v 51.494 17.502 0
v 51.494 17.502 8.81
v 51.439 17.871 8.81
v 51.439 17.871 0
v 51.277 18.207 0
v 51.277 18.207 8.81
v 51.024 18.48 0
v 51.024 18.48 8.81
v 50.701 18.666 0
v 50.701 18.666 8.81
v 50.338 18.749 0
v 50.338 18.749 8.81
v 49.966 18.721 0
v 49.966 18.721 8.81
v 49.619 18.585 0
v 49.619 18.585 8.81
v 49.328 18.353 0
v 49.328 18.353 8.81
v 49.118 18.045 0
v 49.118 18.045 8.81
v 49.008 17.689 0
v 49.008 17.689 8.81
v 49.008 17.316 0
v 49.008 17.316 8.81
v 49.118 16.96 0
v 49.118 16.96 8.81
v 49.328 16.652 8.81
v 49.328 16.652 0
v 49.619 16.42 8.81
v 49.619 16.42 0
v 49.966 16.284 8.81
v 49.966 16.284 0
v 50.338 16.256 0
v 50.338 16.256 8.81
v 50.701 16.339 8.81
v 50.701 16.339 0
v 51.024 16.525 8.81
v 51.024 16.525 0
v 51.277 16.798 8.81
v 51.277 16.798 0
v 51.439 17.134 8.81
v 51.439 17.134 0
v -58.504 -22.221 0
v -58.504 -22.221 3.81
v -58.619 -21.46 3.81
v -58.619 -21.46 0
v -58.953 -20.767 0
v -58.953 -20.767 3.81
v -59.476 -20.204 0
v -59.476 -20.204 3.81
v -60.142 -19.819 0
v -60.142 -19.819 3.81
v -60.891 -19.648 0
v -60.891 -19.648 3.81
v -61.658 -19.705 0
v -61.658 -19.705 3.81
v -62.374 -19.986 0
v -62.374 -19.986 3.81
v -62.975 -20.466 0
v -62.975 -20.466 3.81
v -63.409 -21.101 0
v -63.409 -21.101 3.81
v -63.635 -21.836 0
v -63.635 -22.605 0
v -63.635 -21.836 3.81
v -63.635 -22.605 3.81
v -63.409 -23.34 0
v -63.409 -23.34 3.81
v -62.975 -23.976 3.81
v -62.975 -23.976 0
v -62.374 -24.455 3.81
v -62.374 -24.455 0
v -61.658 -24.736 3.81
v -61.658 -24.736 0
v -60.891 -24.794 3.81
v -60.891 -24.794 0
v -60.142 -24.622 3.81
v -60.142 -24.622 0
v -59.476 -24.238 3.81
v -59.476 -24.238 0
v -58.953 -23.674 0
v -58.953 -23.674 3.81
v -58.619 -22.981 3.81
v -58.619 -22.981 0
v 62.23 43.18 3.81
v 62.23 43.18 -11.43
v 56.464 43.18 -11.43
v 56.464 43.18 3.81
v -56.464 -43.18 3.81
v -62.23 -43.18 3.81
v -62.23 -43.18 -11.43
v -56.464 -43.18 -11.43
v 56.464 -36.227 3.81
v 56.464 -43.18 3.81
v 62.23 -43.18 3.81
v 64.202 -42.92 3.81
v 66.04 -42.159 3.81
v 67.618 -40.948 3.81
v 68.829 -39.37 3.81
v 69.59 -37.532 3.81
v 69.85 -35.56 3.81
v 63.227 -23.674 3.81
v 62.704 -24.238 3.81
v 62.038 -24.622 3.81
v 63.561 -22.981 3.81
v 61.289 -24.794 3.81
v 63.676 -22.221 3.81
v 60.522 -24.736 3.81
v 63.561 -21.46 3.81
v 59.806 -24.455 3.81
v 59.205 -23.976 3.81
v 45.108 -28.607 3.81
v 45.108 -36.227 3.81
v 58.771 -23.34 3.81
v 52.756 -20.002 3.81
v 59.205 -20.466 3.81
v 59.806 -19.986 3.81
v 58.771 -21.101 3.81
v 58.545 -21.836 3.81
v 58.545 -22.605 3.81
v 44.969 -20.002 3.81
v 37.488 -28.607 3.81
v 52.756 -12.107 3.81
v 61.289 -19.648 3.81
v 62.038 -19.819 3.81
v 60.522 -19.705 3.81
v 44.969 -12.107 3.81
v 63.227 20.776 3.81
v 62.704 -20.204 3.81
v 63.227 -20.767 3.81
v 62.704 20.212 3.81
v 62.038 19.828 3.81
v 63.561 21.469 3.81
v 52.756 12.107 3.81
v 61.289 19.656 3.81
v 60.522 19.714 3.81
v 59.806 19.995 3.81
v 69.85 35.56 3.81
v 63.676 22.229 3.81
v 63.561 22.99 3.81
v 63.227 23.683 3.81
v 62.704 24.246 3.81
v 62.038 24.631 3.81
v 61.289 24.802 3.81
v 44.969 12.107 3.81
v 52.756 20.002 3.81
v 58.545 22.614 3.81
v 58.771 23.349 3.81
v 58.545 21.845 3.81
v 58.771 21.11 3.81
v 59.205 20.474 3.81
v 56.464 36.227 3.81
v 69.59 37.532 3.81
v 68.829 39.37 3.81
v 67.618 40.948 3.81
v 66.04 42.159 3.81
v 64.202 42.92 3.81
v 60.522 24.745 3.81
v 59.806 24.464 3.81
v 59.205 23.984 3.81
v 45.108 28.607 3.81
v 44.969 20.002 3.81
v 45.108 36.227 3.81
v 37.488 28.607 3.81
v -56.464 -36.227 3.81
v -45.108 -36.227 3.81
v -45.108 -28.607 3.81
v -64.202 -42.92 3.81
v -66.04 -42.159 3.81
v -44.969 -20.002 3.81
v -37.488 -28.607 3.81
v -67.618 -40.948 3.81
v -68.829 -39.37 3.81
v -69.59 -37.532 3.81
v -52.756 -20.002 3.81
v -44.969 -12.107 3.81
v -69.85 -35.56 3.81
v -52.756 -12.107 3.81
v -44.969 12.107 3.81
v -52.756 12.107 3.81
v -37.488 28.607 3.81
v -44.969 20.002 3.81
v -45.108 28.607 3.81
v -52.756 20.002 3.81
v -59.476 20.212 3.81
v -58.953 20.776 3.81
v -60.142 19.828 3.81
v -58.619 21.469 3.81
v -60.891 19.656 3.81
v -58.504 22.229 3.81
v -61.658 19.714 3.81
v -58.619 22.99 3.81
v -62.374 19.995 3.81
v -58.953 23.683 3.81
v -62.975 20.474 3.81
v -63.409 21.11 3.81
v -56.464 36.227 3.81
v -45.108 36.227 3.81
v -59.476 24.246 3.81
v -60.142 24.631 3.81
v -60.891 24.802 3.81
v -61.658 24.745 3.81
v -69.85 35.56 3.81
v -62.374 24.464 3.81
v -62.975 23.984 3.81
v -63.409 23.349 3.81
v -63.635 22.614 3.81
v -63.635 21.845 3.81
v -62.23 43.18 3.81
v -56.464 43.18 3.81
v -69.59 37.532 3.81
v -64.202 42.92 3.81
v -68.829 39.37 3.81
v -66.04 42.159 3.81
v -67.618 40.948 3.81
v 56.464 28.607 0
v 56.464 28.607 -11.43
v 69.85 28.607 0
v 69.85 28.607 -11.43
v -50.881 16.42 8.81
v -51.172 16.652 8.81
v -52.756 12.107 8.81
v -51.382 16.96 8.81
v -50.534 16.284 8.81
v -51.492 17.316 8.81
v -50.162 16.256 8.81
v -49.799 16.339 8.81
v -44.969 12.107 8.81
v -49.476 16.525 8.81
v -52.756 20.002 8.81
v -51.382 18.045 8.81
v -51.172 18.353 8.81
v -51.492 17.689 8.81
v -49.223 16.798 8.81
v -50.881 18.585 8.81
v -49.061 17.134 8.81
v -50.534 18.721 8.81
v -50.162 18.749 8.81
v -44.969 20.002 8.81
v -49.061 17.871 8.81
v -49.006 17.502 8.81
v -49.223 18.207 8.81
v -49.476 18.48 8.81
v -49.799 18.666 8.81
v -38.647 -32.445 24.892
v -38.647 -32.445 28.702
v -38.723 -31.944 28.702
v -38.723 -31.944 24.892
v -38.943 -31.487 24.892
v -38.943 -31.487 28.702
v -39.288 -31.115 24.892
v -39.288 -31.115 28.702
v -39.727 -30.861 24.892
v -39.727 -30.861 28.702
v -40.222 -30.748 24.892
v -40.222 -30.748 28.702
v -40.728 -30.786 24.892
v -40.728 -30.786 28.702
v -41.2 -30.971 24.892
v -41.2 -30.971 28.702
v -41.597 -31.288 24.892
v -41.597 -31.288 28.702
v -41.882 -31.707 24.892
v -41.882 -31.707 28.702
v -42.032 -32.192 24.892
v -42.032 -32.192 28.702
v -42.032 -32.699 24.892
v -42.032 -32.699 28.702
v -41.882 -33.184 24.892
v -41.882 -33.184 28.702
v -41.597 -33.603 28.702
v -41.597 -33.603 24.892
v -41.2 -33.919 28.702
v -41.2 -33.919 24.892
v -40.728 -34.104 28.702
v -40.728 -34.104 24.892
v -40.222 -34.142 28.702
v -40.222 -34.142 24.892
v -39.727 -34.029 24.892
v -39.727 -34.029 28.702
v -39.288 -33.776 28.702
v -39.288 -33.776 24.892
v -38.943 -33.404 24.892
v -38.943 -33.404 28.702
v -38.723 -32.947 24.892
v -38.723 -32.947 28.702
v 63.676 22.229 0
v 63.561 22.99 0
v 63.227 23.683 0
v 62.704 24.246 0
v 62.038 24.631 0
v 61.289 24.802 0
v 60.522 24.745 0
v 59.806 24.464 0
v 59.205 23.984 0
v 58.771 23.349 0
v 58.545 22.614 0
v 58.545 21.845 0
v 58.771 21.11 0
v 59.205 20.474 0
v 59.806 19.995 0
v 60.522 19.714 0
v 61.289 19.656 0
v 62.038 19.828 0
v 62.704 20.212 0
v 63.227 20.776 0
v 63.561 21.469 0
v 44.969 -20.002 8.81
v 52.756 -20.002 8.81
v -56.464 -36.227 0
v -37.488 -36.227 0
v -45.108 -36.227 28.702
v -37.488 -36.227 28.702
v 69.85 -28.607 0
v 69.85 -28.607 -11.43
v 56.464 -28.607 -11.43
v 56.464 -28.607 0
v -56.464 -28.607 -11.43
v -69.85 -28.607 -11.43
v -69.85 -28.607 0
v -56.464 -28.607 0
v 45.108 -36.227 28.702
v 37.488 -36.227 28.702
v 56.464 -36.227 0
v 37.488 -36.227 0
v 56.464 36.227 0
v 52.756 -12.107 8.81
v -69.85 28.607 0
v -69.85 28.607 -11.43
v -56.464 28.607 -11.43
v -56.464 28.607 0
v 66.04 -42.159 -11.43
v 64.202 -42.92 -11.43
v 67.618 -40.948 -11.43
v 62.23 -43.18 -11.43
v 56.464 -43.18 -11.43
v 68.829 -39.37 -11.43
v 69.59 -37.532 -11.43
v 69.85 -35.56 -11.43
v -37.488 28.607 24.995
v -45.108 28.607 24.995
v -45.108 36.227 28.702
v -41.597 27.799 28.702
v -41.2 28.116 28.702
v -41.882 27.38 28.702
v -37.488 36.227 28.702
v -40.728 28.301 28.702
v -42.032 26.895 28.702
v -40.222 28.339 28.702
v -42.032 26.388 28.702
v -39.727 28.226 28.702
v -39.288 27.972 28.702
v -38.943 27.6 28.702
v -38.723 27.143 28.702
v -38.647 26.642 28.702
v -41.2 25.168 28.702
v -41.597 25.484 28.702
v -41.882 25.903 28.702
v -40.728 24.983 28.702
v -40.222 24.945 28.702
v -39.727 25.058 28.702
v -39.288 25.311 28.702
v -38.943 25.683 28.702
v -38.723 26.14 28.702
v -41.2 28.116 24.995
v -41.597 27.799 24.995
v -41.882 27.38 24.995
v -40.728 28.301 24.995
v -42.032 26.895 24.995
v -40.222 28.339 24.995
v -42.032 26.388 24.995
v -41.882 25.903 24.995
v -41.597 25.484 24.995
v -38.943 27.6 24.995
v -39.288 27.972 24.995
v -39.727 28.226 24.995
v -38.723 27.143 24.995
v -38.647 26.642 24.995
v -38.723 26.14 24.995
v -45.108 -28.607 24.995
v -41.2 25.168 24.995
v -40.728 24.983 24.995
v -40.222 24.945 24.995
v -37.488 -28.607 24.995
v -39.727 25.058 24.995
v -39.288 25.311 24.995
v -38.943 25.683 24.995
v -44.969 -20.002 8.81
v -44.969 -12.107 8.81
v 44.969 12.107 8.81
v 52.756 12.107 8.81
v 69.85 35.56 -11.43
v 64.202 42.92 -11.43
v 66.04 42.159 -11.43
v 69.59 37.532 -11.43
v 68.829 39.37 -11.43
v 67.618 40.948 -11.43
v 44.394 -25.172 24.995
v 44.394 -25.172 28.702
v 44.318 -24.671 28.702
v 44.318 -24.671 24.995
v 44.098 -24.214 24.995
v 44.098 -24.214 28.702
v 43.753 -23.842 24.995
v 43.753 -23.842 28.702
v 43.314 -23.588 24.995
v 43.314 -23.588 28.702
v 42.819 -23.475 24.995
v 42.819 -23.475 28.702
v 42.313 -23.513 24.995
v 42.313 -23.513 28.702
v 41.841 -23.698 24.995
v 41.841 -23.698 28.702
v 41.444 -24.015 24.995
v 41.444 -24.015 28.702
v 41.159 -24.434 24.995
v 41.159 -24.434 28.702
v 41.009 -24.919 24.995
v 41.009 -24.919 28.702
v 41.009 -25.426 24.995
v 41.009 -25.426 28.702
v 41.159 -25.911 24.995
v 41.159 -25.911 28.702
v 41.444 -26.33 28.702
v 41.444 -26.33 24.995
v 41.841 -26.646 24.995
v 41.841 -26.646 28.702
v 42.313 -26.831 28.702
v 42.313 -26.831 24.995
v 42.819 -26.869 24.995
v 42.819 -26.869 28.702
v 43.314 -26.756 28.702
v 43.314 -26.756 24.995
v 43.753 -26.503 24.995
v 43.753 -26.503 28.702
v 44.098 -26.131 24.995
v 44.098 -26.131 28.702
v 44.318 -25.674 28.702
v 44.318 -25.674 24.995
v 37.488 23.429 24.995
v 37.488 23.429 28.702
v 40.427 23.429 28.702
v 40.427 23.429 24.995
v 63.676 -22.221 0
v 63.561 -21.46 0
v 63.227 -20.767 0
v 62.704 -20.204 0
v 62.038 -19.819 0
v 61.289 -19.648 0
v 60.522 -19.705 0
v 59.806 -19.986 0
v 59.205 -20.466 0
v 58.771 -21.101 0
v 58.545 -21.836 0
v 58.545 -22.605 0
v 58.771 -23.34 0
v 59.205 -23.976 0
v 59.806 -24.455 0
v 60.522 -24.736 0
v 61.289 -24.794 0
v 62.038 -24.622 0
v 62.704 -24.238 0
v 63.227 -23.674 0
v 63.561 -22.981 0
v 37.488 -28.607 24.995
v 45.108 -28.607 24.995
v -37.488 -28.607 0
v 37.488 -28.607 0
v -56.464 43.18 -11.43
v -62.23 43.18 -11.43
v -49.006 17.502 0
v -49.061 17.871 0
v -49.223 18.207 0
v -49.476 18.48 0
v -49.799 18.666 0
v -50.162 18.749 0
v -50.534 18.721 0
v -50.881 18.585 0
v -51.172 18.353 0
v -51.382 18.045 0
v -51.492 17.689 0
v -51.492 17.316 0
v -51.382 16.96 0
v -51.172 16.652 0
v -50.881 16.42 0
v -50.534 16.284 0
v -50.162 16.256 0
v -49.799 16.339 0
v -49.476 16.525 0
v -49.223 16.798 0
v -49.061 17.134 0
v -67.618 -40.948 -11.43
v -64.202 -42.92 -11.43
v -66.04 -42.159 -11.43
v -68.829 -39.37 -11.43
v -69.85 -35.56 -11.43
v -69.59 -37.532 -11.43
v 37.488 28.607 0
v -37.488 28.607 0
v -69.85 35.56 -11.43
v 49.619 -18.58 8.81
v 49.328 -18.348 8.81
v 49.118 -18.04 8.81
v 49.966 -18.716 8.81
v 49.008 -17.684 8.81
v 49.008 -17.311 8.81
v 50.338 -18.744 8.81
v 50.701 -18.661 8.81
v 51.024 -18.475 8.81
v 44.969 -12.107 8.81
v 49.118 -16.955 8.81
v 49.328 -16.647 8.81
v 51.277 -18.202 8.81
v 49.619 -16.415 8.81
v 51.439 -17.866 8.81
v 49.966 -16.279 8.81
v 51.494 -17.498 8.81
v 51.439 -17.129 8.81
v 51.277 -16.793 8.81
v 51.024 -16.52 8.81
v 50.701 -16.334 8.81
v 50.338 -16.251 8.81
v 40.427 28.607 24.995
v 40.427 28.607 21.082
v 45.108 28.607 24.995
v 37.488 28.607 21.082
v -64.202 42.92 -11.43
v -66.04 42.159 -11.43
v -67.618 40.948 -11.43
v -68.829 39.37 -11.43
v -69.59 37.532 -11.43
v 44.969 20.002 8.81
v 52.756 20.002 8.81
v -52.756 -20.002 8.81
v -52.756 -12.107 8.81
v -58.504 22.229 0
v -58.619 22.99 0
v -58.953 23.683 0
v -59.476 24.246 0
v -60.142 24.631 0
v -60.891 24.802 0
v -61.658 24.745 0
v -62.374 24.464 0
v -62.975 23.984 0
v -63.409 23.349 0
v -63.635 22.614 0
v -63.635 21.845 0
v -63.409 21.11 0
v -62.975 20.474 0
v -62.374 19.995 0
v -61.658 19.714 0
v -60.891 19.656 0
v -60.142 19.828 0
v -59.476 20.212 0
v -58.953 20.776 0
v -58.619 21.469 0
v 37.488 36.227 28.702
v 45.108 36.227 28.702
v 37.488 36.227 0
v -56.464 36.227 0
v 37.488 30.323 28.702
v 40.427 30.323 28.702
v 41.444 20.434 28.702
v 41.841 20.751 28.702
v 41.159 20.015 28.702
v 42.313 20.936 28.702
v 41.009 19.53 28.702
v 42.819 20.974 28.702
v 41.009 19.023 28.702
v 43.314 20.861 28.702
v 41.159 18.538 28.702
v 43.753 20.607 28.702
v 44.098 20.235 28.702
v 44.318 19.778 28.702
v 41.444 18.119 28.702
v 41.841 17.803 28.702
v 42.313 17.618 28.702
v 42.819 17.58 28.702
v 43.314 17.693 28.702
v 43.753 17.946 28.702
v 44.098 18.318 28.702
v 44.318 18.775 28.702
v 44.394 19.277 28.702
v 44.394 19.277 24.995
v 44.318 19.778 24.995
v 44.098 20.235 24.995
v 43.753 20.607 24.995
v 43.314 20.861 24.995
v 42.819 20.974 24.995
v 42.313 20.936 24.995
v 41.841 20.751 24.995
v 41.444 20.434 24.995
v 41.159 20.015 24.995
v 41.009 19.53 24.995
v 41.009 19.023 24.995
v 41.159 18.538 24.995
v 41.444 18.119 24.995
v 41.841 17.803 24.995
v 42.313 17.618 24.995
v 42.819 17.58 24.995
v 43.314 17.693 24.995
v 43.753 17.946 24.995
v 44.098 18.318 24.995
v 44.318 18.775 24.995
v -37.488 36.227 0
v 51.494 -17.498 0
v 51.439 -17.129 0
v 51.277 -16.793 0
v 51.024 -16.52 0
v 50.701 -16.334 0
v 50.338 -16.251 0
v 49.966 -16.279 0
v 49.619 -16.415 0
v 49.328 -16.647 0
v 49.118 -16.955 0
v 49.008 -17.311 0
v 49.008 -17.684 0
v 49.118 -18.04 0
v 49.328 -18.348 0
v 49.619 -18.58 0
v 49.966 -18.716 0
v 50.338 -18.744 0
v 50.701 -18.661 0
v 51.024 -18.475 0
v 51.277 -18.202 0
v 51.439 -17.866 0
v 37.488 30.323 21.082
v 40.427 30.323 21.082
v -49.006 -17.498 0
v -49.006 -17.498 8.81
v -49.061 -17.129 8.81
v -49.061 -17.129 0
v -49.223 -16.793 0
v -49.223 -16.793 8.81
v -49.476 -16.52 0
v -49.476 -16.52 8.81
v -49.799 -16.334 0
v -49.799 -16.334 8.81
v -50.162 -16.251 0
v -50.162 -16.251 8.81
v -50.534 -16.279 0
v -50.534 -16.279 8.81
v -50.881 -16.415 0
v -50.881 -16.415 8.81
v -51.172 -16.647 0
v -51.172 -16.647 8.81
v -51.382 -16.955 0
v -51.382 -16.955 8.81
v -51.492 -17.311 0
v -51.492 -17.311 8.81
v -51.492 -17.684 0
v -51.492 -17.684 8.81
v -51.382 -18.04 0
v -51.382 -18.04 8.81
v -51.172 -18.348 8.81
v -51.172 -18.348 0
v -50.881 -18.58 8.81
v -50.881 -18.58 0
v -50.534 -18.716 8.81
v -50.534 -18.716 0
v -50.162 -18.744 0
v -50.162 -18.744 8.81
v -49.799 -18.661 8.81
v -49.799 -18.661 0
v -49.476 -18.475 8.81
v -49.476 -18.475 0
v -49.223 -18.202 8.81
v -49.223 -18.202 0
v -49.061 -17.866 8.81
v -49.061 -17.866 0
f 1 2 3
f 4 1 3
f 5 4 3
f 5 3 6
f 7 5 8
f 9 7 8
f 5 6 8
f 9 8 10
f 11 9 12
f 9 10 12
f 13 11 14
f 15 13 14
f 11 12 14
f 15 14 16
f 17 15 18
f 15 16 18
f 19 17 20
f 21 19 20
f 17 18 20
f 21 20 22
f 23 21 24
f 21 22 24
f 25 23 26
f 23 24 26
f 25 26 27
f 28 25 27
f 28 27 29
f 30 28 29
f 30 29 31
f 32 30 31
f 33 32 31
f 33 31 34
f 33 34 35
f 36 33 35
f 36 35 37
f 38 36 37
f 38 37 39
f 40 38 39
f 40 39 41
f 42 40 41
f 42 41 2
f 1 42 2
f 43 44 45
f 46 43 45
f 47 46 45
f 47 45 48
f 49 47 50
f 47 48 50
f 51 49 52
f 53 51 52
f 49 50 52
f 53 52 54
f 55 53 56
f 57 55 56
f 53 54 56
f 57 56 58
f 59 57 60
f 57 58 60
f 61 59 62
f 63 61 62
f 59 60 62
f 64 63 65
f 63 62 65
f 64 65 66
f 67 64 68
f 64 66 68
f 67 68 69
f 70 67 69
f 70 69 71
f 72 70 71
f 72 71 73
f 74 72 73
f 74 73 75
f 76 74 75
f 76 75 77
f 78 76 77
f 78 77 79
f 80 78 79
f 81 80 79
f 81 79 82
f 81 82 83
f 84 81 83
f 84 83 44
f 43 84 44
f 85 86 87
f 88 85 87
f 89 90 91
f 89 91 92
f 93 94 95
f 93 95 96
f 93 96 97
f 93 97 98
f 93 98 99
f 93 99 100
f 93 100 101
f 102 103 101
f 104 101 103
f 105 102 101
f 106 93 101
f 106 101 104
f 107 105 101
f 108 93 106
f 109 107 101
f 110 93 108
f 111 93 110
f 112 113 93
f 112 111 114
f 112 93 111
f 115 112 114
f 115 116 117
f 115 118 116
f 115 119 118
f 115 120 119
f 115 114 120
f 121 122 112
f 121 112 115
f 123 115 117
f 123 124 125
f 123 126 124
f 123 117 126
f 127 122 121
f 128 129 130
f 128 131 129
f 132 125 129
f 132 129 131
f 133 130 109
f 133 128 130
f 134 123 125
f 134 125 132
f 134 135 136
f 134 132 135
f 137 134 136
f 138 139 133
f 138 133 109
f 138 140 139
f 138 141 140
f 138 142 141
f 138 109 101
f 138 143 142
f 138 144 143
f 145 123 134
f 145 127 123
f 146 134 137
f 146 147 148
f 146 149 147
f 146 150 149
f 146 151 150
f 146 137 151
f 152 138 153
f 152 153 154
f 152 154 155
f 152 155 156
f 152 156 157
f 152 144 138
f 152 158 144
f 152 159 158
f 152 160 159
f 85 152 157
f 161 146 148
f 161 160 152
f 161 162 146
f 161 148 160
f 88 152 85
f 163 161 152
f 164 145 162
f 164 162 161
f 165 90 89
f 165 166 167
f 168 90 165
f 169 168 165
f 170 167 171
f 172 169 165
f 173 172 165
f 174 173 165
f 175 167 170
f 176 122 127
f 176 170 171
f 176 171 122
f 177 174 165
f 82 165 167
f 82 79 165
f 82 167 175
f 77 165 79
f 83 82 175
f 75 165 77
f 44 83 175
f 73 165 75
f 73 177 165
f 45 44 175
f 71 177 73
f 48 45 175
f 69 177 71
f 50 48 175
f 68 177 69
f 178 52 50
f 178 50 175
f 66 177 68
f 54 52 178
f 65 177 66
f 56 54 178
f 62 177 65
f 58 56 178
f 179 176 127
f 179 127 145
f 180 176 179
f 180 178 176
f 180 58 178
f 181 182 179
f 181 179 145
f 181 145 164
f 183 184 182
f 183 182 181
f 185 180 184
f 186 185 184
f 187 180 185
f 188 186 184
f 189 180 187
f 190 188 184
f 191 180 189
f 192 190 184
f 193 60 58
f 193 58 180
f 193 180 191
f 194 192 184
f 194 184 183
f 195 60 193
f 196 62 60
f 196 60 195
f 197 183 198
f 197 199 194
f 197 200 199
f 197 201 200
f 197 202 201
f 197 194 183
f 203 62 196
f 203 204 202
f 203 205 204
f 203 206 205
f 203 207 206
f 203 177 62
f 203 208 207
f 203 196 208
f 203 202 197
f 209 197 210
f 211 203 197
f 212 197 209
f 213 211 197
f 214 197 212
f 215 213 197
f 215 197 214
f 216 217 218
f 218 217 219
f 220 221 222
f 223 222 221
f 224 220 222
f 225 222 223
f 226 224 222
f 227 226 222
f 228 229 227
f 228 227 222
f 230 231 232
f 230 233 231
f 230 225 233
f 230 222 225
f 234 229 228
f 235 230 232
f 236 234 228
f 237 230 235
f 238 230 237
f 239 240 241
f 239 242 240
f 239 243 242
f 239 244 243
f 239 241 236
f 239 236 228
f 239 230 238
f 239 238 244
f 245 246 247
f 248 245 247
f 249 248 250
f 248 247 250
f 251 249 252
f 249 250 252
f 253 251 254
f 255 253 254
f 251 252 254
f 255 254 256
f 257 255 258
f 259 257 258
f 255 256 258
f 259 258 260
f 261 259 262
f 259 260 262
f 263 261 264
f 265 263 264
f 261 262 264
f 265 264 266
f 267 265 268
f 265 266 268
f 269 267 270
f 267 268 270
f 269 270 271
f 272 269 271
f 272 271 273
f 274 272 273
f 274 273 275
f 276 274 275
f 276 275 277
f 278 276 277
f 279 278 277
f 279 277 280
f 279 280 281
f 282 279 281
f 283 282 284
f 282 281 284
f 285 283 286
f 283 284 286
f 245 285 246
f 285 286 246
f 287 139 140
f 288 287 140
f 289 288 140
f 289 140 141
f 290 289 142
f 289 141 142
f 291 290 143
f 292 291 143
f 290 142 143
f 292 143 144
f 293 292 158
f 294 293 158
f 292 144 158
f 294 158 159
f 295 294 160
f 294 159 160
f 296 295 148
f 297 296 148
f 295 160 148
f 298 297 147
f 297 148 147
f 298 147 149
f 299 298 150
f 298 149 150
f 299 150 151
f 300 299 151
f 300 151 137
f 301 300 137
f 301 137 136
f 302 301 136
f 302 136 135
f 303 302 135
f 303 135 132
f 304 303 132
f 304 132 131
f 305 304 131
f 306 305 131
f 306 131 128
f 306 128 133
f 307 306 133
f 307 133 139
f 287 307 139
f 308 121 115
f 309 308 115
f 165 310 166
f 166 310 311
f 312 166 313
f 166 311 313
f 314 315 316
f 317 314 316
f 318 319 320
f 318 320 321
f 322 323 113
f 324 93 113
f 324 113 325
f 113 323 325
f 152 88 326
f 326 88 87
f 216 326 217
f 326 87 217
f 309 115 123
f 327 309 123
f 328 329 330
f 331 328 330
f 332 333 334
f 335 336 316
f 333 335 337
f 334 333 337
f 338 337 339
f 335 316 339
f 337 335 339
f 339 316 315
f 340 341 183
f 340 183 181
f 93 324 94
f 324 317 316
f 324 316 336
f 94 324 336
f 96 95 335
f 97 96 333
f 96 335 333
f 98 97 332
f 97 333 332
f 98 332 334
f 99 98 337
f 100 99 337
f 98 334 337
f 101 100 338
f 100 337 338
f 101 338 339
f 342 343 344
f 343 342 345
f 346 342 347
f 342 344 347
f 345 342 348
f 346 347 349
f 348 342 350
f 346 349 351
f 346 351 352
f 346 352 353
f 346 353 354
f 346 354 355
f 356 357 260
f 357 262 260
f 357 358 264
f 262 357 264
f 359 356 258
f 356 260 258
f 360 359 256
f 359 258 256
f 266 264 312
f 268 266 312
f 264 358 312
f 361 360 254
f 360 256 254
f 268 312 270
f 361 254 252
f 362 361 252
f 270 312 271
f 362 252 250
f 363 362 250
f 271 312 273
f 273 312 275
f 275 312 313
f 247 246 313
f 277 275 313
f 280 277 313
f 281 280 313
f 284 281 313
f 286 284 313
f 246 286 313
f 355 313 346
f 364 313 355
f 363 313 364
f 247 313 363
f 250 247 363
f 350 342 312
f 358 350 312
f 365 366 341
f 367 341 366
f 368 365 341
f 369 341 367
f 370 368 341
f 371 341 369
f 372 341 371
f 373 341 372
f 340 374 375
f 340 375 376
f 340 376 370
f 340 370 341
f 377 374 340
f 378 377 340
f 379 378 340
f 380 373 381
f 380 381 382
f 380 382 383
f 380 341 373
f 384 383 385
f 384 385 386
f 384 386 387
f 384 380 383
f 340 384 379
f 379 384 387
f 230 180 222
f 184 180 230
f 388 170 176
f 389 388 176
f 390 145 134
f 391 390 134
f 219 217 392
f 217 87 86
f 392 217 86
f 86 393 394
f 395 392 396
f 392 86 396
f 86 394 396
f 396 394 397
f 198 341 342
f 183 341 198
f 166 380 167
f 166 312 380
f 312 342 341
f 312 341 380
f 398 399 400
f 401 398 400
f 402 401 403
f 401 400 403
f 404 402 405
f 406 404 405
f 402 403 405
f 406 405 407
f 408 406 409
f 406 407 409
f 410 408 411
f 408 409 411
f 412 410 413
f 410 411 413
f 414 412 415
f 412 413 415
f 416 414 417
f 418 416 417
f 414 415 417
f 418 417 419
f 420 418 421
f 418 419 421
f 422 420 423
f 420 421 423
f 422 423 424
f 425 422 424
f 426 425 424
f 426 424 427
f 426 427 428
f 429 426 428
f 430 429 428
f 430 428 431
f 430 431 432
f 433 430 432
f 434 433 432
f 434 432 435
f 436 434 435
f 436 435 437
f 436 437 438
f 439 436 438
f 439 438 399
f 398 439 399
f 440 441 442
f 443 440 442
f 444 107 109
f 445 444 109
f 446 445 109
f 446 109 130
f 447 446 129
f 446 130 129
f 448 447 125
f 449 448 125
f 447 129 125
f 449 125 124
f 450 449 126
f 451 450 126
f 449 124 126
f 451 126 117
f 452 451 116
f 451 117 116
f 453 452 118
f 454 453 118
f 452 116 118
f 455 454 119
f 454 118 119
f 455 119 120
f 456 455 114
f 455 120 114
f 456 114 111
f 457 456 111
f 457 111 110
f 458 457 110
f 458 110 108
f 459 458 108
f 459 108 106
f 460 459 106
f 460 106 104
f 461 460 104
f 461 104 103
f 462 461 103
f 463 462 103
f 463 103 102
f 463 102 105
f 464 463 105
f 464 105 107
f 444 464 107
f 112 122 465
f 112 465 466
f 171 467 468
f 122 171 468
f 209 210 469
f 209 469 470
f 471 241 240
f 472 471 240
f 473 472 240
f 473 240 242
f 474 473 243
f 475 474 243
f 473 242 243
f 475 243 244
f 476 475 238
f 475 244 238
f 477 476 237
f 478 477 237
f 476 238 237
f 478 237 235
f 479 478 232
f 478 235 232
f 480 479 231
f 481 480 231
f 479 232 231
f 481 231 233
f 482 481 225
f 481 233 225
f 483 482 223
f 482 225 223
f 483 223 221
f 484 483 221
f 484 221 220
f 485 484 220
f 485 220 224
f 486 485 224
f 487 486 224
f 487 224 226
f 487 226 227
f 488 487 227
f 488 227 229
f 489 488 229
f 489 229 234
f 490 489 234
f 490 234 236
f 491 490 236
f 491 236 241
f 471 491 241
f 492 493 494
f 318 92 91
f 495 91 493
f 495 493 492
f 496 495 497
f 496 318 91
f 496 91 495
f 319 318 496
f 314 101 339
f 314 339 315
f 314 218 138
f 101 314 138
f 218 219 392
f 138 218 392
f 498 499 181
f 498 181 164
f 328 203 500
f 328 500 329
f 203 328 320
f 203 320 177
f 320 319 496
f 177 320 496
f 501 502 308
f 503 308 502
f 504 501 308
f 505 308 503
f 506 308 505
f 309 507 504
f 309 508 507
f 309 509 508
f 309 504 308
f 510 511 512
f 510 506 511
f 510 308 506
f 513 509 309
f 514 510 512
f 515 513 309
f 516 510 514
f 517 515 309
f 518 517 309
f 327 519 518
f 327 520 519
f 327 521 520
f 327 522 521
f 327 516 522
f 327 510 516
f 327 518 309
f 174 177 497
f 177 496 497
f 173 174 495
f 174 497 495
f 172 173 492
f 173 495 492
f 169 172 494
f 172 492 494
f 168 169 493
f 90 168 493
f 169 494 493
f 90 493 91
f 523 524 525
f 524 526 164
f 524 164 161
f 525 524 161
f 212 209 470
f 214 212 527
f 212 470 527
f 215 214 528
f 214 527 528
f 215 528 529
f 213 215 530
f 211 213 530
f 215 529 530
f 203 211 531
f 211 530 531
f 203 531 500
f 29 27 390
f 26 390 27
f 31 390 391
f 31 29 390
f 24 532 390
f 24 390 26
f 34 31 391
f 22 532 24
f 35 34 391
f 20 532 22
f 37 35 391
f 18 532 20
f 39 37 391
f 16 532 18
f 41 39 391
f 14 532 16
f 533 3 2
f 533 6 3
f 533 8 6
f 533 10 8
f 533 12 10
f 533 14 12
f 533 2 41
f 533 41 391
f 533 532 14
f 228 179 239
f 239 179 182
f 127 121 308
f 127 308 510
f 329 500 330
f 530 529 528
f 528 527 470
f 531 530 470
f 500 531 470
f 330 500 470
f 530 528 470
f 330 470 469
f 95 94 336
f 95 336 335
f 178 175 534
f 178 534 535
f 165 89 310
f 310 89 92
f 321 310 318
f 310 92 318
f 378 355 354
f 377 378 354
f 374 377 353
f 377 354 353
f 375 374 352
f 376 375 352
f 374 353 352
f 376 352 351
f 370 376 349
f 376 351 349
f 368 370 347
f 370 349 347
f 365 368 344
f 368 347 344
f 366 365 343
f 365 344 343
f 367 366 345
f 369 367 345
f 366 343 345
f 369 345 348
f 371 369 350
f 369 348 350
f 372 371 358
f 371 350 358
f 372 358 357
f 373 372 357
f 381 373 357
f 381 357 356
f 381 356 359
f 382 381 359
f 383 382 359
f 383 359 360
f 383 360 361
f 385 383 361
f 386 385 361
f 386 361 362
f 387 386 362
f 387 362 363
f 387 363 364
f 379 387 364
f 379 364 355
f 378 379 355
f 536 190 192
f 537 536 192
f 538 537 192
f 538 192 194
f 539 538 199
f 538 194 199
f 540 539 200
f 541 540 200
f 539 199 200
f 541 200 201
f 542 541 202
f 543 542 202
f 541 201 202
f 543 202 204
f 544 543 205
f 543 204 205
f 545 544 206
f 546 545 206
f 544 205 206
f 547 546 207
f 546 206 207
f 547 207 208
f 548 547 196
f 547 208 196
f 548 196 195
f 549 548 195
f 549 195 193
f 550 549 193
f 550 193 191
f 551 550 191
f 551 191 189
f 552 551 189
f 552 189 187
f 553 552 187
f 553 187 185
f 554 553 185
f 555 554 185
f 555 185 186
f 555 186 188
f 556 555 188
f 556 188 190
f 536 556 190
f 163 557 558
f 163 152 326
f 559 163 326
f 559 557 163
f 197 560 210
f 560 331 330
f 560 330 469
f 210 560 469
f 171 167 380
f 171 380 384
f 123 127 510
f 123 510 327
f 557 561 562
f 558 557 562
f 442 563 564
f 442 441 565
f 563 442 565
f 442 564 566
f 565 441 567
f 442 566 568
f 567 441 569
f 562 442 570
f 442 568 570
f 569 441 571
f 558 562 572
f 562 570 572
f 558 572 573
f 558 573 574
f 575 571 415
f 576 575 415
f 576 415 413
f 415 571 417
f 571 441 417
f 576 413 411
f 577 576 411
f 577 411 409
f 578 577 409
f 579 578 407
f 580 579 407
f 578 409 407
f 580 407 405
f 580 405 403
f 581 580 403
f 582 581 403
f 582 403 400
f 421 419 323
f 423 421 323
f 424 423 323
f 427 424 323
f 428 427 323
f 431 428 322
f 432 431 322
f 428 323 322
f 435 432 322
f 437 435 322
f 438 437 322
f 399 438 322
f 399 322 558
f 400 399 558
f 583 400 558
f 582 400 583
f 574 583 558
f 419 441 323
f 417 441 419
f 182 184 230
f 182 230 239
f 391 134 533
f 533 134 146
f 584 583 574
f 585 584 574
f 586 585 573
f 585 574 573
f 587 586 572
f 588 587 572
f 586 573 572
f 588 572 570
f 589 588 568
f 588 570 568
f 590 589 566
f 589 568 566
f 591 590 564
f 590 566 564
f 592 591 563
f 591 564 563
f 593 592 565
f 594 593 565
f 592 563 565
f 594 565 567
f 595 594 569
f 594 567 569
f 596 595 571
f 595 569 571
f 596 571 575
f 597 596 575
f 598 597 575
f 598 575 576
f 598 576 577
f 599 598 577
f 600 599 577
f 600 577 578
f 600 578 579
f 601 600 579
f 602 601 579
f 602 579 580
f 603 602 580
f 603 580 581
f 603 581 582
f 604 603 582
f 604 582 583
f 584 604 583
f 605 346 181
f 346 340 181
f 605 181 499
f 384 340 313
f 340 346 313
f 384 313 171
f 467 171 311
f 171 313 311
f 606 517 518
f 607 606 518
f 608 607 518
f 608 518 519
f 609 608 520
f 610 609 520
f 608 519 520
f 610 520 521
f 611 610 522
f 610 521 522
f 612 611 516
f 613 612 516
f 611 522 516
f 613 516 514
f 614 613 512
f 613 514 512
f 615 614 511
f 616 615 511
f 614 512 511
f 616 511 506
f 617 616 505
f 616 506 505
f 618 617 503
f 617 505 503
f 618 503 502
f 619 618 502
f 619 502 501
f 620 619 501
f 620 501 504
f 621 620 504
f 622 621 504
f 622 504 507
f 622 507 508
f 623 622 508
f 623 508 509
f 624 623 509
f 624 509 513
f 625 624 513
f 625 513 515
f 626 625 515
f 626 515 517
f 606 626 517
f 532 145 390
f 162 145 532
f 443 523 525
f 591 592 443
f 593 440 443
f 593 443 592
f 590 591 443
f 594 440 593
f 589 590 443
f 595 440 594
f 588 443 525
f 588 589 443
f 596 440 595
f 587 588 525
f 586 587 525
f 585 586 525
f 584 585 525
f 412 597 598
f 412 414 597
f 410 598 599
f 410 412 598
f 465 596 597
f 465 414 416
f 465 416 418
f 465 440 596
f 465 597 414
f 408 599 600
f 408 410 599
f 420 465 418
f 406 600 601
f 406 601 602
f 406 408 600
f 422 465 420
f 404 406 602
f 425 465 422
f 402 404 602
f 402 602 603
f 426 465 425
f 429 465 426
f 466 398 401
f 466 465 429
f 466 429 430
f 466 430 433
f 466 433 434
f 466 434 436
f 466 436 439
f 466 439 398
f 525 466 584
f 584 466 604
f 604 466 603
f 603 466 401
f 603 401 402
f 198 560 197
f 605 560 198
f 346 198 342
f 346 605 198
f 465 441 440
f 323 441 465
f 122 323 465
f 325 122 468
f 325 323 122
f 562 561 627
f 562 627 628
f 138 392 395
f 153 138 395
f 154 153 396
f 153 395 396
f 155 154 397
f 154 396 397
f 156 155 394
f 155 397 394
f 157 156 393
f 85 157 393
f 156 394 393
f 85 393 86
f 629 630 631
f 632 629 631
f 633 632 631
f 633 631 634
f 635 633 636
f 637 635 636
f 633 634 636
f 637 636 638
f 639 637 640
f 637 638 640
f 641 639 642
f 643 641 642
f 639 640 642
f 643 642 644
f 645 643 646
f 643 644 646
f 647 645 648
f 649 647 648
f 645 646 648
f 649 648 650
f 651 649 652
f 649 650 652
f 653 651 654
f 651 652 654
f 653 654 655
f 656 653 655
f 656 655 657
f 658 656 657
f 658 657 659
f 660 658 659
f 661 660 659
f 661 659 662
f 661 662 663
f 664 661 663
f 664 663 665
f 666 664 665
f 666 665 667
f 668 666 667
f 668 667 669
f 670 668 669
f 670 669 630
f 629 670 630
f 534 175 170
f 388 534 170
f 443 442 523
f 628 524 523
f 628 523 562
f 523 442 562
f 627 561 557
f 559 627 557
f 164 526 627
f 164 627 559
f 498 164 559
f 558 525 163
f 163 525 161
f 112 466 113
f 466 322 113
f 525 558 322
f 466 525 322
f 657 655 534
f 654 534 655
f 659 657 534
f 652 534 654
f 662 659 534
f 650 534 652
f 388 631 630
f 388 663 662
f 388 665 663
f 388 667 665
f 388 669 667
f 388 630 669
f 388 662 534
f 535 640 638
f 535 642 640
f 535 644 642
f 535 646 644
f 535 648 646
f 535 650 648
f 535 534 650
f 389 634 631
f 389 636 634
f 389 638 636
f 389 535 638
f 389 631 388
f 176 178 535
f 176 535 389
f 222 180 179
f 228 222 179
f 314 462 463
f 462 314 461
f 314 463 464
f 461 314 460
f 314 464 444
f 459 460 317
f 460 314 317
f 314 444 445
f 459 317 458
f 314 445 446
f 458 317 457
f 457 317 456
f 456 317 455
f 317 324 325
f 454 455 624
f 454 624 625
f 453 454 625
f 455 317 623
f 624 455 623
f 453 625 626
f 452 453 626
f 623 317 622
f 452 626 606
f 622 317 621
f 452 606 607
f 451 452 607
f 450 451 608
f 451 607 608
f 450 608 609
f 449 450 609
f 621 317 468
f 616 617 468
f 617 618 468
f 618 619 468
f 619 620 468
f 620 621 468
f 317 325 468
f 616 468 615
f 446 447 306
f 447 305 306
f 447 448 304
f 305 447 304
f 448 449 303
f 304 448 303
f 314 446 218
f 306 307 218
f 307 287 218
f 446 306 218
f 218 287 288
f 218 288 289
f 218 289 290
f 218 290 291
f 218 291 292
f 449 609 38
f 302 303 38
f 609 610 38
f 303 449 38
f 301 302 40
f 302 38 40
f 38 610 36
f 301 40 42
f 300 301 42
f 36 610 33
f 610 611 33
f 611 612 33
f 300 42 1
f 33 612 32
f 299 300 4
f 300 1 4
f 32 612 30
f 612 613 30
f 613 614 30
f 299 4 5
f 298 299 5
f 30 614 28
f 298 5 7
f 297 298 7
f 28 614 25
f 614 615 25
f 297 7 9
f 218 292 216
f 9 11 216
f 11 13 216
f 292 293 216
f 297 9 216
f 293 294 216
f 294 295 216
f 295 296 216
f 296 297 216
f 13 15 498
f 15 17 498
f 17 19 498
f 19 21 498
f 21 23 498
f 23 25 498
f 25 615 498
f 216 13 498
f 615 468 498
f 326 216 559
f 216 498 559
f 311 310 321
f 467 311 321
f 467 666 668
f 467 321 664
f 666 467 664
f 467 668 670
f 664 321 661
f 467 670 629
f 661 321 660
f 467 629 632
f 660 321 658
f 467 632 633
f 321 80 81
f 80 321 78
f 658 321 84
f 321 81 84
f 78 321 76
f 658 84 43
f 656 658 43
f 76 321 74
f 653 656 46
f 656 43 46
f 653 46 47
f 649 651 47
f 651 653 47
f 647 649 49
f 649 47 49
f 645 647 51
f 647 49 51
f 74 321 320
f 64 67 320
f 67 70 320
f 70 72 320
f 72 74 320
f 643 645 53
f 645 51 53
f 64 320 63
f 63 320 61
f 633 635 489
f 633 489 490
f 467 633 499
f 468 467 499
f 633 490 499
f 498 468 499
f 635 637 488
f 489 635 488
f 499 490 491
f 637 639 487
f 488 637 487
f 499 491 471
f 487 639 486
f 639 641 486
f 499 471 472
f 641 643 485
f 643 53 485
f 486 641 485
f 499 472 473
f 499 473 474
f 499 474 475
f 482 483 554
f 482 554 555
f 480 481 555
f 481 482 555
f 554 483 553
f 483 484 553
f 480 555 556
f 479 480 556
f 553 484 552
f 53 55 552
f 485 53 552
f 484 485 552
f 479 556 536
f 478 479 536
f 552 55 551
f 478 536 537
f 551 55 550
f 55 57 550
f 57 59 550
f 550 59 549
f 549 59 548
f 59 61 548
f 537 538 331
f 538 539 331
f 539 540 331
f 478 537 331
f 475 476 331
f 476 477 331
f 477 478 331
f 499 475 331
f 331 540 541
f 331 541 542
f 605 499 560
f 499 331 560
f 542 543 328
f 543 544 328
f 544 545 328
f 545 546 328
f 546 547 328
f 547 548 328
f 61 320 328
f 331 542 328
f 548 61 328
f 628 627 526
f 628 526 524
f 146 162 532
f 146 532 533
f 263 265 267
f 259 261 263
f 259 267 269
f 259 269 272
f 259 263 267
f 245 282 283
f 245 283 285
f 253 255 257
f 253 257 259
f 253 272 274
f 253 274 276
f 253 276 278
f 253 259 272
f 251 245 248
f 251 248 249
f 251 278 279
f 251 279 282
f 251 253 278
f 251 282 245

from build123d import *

# Parameters (mm, degrees)
SKETCH1_W             = 112.9284
SKETCH1_H             = 57.214943904
BOSS_EXTRUDE1_DEPTH   = 3.81
BOSS_EXTRUDE2_START   = 11.43
BOSS_EXTRUDE2_DEPTH   = 11.43
CUT_EXTRUDE1_REACH    = 85.521
SKETCH3_R             = 2.58
SKETCH4_W             = 7.786771744
SKETCH4_H             = 7.895685894
BOSS_EXTRUDE3_DEPTH   = 5
CUT_EXTRUDE2_REACH    = 86.577
SKETCH5_R             = 1.25
SKETCH8_W             = 7.62
SKETCH8_H             = 7.62
BOSS_EXTRUDE4_DEPTH   = 24.892
BOSS_EXTRUDE4_2_DEPTH = 24.892
BOSS_EXTRUDE4_3_DEPTH = 24.892
BOSS_EXTRUDE4_4_DEPTH = 24.892
SKETCH9_W             = 7.62
SKETCH9_H             = 7.62
BOSS_EXTRUDE5_DEPTH   = 3.81
BOSS_EXTRUDE6_REACH   = 106.193
SKETCH10_W            = 7.62
SKETCH10_H            = 3.70730408
BOSS_EXTRUDE7_REACH   = 128.11
SKETCH11_W            = 3.81
SKETCH11_H            = 7.62
BOSS_EXTRUDE8_REACH   = 128.11
SKETCH12_W            = 3.81
SKETCH12_H            = 7.62
SKETCH14_R            = 1.7018
CUT_EXTRUDE3_DEPTH    = 3.81
SKETCH16_W            = 2.93944059
SKETCH16_H            = 6.893445181
CUT_EXTRUDE4_DEPTH    = 7.62


with BuildPart() as part:
    # Sketch1 → Boss-Extrude1 (new body)
    with BuildSketch(Plane.XY):
        with BuildLine():
            Line((-56.4642, -28.607471952), (-56.4642, 28.607471952))
            Line((-56.4642, 28.607471952), (-56.4642, 43.18))
            Line((-56.4642, 43.18), (-62.23, 43.18))
            ThreePointArc((-62.23, 43.18), (-67.618153673, 40.948153673), (-69.85, 35.56))
            Line((-69.85, 35.56), (-69.85, -35.56))
            ThreePointArc((-69.85, -35.56), (-67.618153673, -40.948153673), (-62.23, -43.18))
            Line((-62.23, -43.18), (-56.4642, -43.18))
            Line((-56.4642, -43.18), (-56.4642, -28.607471952))
        make_face()
        Rectangle(SKETCH1_W, SKETCH1_H)
        with BuildLine():
            Line((56.4642, 43.18), (56.4642, 28.607471952))
            Line((56.4642, 28.607471952), (56.4642, -28.607471952))
            Line((56.4642, -28.607471952), (56.4642, -43.18))
            Line((56.4642, -43.18), (62.23, -43.18))
            ThreePointArc((62.23, -43.18), (67.618153673, -40.948153673), (69.85, -35.56))
            Line((69.85, -35.56), (69.85, 35.56))
            ThreePointArc((69.85, 35.56), (67.618153673, 40.948153673), (62.23, 43.18))
            Line((62.23, 43.18), (56.4642, 43.18))
        make_face()
    extrude(amount=BOSS_EXTRUDE1_DEPTH)

    # Sketch2 → Boss-Extrude2 (add)
    with BuildSketch(Plane(origin=(0, 0, 0), x_dir=(-1, 0, 0), z_dir=(0, 0, -1)).offset(BOSS_EXTRUDE2_START)):
        with BuildLine():
            Line((-62.23, 43.18), (-56.4642, 43.18))
            Line((-56.4642, 43.18), (-56.4642, 28.607471952))
            Line((-56.4642, 28.607471952), (-69.85, 28.607471952))
            Line((-69.85, 28.607471952), (-69.85, 35.56))
            ThreePointArc((-69.85, 35.56), (-67.618153673, 40.948153673), (-62.23, 43.18))
        make_face()
        with BuildLine():
            Line((69.85, 28.607471952), (56.4642, 28.607471952))
            Line((56.4642, 28.607471952), (56.4642, 43.18))
            Line((56.4642, 43.18), (62.23, 43.18))
            ThreePointArc((62.23, 43.18), (67.618153673, 40.948153673), (69.85, 35.56))
            Line((69.85, 35.56), (69.85, 28.607471952))
        make_face()
        with BuildLine():
            Line((69.85, -35.56), (69.85, -28.607471952))
            Line((69.85, -28.607471952), (56.4642, -28.607471952))
            Line((56.4642, -28.607471952), (56.4642, -43.18))
            Line((56.4642, -43.18), (62.23, -43.18))
            ThreePointArc((62.23, -43.18), (67.618153673, -40.948153673), (69.85, -35.56))
        make_face()
        with BuildLine():
            Line((-69.85, -28.607471952), (-56.4642, -28.607471952))
            Line((-56.4642, -28.607471952), (-56.4642, -43.18))
            Line((-56.4642, -43.18), (-62.23, -43.18))
            ThreePointArc((-62.23, -43.18), (-67.618153673, -40.948153673), (-69.85, -35.56))
            Line((-69.85, -35.56), (-69.85, -28.607471952))
        make_face()
    extrude(amount=-BOSS_EXTRUDE2_DEPTH)

    # Sketch3 → Cut-Extrude1 (cut, up to next)
    with BuildSketch(Plane.XY.offset(3.81), mode=Mode.PRIVATE) as cut_extrude1_sk1:
        with Locations((-61.0842, 22.2292)):
            Circle(SKETCH3_R)
    cut_extrude1_tool1 = extrude(cut_extrude1_sk1.sketch, amount=-CUT_EXTRUDE1_REACH, mode=Mode.PRIVATE) & part.part
    # Sketch3 → Cut-Extrude1 (cut, up to next)
    with BuildSketch(Plane.XY.offset(3.81), mode=Mode.PRIVATE) as cut_extrude1_sk2:
        with Locations((-61.0842, -22.2208)):
            Circle(SKETCH3_R)
    cut_extrude1_tool2 = extrude(cut_extrude1_sk2.sketch, amount=-CUT_EXTRUDE1_REACH, mode=Mode.PRIVATE) & part.part
    # Sketch3 → Cut-Extrude1 (cut, up to next)
    with BuildSketch(Plane.XY.offset(3.81), mode=Mode.PRIVATE) as cut_extrude1_sk3:
        with Locations((61.0958, -22.2208)):
            Circle(SKETCH3_R)
    cut_extrude1_tool3 = extrude(cut_extrude1_sk3.sketch, amount=-CUT_EXTRUDE1_REACH, mode=Mode.PRIVATE) & part.part
    # Sketch3 → Cut-Extrude1 (cut, up to next)
    with BuildSketch(Plane.XY.offset(3.81), mode=Mode.PRIVATE) as cut_extrude1_sk4:
        with Locations((61.0958, 22.2292)):
            Circle(SKETCH3_R)
    cut_extrude1_tool4 = extrude(cut_extrude1_sk4.sketch, amount=-CUT_EXTRUDE1_REACH, mode=Mode.PRIVATE) & part.part
    add(cut_extrude1_tool1.solids().sort_by_distance((-61.0842, 22.2292, 3.81))[0], mode=Mode.SUBTRACT)
    add(cut_extrude1_tool2.solids().sort_by_distance((-61.0842, -22.2208, 3.81))[0], mode=Mode.SUBTRACT)
    add(cut_extrude1_tool3.solids().sort_by_distance((61.0958, -22.2208, 3.81))[0], mode=Mode.SUBTRACT)
    add(cut_extrude1_tool4.solids().sort_by_distance((61.0958, 22.2292, 3.81))[0], mode=Mode.SUBTRACT)

    # Sketch4 → Boss-Extrude3 (add)
    with BuildSketch(Plane.XY.offset(3.81)):
        with Locations((-48.862414128, 16.054657053)):
            Rectangle(SKETCH4_W, SKETCH4_H)
        with Locations((48.862414128, 16.054657053)):
            Rectangle(SKETCH4_W, SKETCH4_H)
        with Locations((48.862414128, -16.054657053)):
            Rectangle(SKETCH4_W, SKETCH4_H)
        with Locations((-48.862414128, -16.054657053)):
            Rectangle(SKETCH4_W, SKETCH4_H)
    extrude(amount=BOSS_EXTRUDE3_DEPTH)

    # Sketch5 → Cut-Extrude2 (cut, up to next)
    with BuildSketch(Plane.XY.offset(8.81), mode=Mode.PRIVATE) as cut_extrude2_sk1:
        with Locations((50.2442, 17.5025)):
            Circle(SKETCH5_R)
    cut_extrude2_tool1 = extrude(cut_extrude2_sk1.sketch, amount=-CUT_EXTRUDE2_REACH, mode=Mode.PRIVATE) & part.part
    # Sketch5 → Cut-Extrude2 (cut, up to next)
    with BuildSketch(Plane.XY.offset(8.81), mode=Mode.PRIVATE) as cut_extrude2_sk2:
        with Locations((50.2442, -17.4975)):
            Circle(SKETCH5_R)
    cut_extrude2_tool2 = extrude(cut_extrude2_sk2.sketch, amount=-CUT_EXTRUDE2_REACH, mode=Mode.PRIVATE) & part.part
    # Sketch5 → Cut-Extrude2 (cut, up to next)
    with BuildSketch(Plane.XY.offset(8.81), mode=Mode.PRIVATE) as cut_extrude2_sk3:
        with Locations((-50.2558, -17.4975)):
            Circle(SKETCH5_R)
    cut_extrude2_tool3 = extrude(cut_extrude2_sk3.sketch, amount=-CUT_EXTRUDE2_REACH, mode=Mode.PRIVATE) & part.part
    # Sketch5 → Cut-Extrude2 (cut, up to next)
    with BuildSketch(Plane.XY.offset(8.81), mode=Mode.PRIVATE) as cut_extrude2_sk4:
        with Locations((-50.2558, 17.5025)):
            Circle(SKETCH5_R)
    cut_extrude2_tool4 = extrude(cut_extrude2_sk4.sketch, amount=-CUT_EXTRUDE2_REACH, mode=Mode.PRIVATE) & part.part
    add(cut_extrude2_tool1.solids().sort_by_distance((50.2442, 17.5025, 8.81))[0], mode=Mode.SUBTRACT)
    add(cut_extrude2_tool2.solids().sort_by_distance((50.2442, -17.4975, 8.81))[0], mode=Mode.SUBTRACT)
    add(cut_extrude2_tool3.solids().sort_by_distance((-50.2558, -17.4975, 8.81))[0], mode=Mode.SUBTRACT)
    add(cut_extrude2_tool4.solids().sort_by_distance((-50.2558, 17.5025, 8.81))[0], mode=Mode.SUBTRACT)



with BuildPart() as body_2:
    # Sketch8 → Boss-Extrude4 (new body)
    with BuildSketch(Plane.XY.offset(3.81)):
        with Locations((-41.297898441, 32.417471952)):
            Rectangle(SKETCH8_W, SKETCH8_H)
    extrude(amount=BOSS_EXTRUDE4_DEPTH)


with BuildPart() as body_3:
    # Sketch8 → Boss-Extrude4 2 (new body)
    with BuildSketch(Plane.XY.offset(3.81)):
        with Locations((41.297898441, 32.417471952)):
            Rectangle(SKETCH8_W, SKETCH8_H)
    extrude(amount=BOSS_EXTRUDE4_2_DEPTH)


with BuildPart() as body_4:
    # Sketch8 → Boss-Extrude4 3 (new body)
    with BuildSketch(Plane.XY.offset(3.81)):
        with Locations((41.297898441, -32.417471952)):
            Rectangle(SKETCH8_W, SKETCH8_H)
    extrude(amount=BOSS_EXTRUDE4_3_DEPTH)


with BuildPart() as body_5:
    # Sketch8 → Boss-Extrude4 4 (new body)
    with BuildSketch(Plane.XY.offset(3.81)):
        with Locations((-41.297898441, -32.417471952)):
            Rectangle(SKETCH8_W, SKETCH8_H)
    extrude(amount=BOSS_EXTRUDE4_4_DEPTH)


with BuildPart() as part_1:
    add(part.part)

    add(body_2.part)  # Boss-Extrude5 merges body 2

    add(body_3.part)  # Boss-Extrude5 merges body 3

    add(body_4.part)  # Boss-Extrude5 merges body 4

    add(body_5.part)  # Boss-Extrude5 merges body 5
    # Sketch9 → Boss-Extrude5 (add)
    with BuildSketch(Plane.XY.offset(3.81)):
        with Locations((41.297898441, 32.417471952)):
            Rectangle(SKETCH9_W, SKETCH9_H)
        with Locations((-41.297898441, 32.417471952)):
            Rectangle(SKETCH9_W, SKETCH9_H)
        with Locations((-41.297898441, -32.417471952)):
            Rectangle(SKETCH9_W, SKETCH9_H)
        with Locations((41.297898441, -32.417471952)):
            Rectangle(SKETCH9_W, SKETCH9_H)
    extrude(amount=-BOSS_EXTRUDE5_DEPTH)

    # Sketch10 → Boss-Extrude6 (add, up to next)
    with BuildSketch(Plane(origin=(0, -28.607471952, 0), x_dir=(1, 0, 0), z_dir=(0, 1, 0)), mode=Mode.PRIVATE) as boss_extrude6_sk1:
        with Locations((-41.297898441, -26.84834796)):
            Rectangle(SKETCH10_W, SKETCH10_H)
    boss_extrude6_tool1 = extrude(boss_extrude6_sk1.sketch, amount=BOSS_EXTRUDE6_REACH, mode=Mode.PRIVATE) - part_1.part
    # Sketch10 → Boss-Extrude6 (add, up to next)
    with BuildSketch(Plane(origin=(0, -28.607471952, 0), x_dir=(1, 0, 0), z_dir=(0, 1, 0)), mode=Mode.PRIVATE) as boss_extrude6_sk2:
        with Locations((41.297898441, -26.84834796)):
            Rectangle(SKETCH10_W, SKETCH10_H)
    boss_extrude6_tool2 = extrude(boss_extrude6_sk2.sketch, amount=BOSS_EXTRUDE6_REACH, mode=Mode.PRIVATE) - part_1.part
    add(boss_extrude6_tool1.solids().sort_by_distance((-41.297898, -28.607472, 26.848348))[0])
    add(boss_extrude6_tool2.solids().sort_by_distance((41.297898, -28.607472, 26.848348))[0])

    # Sketch11 → Boss-Extrude7 (add, up to next)
    with BuildSketch(Plane.ZY.offset(45.107898441), mode=Mode.PRIVATE) as boss_extrude7_sk1:
        with Locations((1.905, -32.417471952)):
            Rectangle(SKETCH11_W, SKETCH11_H)
    boss_extrude7_tool1 = extrude(boss_extrude7_sk1.sketch, amount=BOSS_EXTRUDE7_REACH, mode=Mode.PRIVATE) - part_1.part
    # Sketch11 → Boss-Extrude7 (add, up to next)
    with BuildSketch(Plane.ZY.offset(45.107898441), mode=Mode.PRIVATE) as boss_extrude7_sk2:
        with Locations((1.905, 32.417471952)):
            Rectangle(SKETCH11_W, SKETCH11_H)
    boss_extrude7_tool2 = extrude(boss_extrude7_sk2.sketch, amount=BOSS_EXTRUDE7_REACH, mode=Mode.PRIVATE) - part_1.part
    add(boss_extrude7_tool1.solids().sort_by_distance((-45.107898, -32.417472, 1.905))[0])
    add(boss_extrude7_tool2.solids().sort_by_distance((-45.107898, 32.417472, 1.905))[0])

    # Sketch12 → Boss-Extrude8 (add, up to next)
    with BuildSketch(Plane(origin=(45.107898441, 0, 0), x_dir=(0, 0, -1), z_dir=(1, 0, 0)), mode=Mode.PRIVATE) as boss_extrude8_sk1:
        with Locations((-1.905, 32.417471952)):
            Rectangle(SKETCH12_W, SKETCH12_H)
    boss_extrude8_tool1 = extrude(boss_extrude8_sk1.sketch, amount=BOSS_EXTRUDE8_REACH, mode=Mode.PRIVATE) - part_1.part
    # Sketch12 → Boss-Extrude8 (add, up to next)
    with BuildSketch(Plane(origin=(45.107898441, 0, 0), x_dir=(0, 0, -1), z_dir=(1, 0, 0)), mode=Mode.PRIVATE) as boss_extrude8_sk2:
        with Locations((-1.905, -32.417471952)):
            Rectangle(SKETCH12_W, SKETCH12_H)
    boss_extrude8_tool2 = extrude(boss_extrude8_sk2.sketch, amount=BOSS_EXTRUDE8_REACH, mode=Mode.PRIVATE) - part_1.part
    add(boss_extrude8_tool1.solids().sort_by_distance((45.107898, 32.417472, 1.905))[0])
    add(boss_extrude8_tool2.solids().sort_by_distance((45.107898, -32.417472, 1.905))[0])

    # Sketch14 → Cut-Extrude3 (cut)
    with BuildSketch(Plane.XY.offset(28.702)):
        with Locations((-40.34905784, 26.641762983)):
            Circle(SKETCH14_R)
        with Locations((-40.34905784, -32.445162443)):
            Circle(SKETCH14_R)
        with Locations((42.691835463, 19.276786892)):
            Circle(SKETCH14_R)
        with Locations((42.691835463, -25.172251079)):
            Circle(SKETCH14_R)
    extrude(amount=-CUT_EXTRUDE3_DEPTH, mode=Mode.SUBTRACT)

    # Sketch16 → Cut-Extrude4 (cut)
    with BuildSketch(Plane.XY.offset(28.702)):
        with Locations((38.957618736, 26.875922591)):
            Rectangle(SKETCH16_W, SKETCH16_H)
    extrude(amount=-CUT_EXTRUDE4_DEPTH, mode=Mode.SUBTRACT)


solid = part_1.part
